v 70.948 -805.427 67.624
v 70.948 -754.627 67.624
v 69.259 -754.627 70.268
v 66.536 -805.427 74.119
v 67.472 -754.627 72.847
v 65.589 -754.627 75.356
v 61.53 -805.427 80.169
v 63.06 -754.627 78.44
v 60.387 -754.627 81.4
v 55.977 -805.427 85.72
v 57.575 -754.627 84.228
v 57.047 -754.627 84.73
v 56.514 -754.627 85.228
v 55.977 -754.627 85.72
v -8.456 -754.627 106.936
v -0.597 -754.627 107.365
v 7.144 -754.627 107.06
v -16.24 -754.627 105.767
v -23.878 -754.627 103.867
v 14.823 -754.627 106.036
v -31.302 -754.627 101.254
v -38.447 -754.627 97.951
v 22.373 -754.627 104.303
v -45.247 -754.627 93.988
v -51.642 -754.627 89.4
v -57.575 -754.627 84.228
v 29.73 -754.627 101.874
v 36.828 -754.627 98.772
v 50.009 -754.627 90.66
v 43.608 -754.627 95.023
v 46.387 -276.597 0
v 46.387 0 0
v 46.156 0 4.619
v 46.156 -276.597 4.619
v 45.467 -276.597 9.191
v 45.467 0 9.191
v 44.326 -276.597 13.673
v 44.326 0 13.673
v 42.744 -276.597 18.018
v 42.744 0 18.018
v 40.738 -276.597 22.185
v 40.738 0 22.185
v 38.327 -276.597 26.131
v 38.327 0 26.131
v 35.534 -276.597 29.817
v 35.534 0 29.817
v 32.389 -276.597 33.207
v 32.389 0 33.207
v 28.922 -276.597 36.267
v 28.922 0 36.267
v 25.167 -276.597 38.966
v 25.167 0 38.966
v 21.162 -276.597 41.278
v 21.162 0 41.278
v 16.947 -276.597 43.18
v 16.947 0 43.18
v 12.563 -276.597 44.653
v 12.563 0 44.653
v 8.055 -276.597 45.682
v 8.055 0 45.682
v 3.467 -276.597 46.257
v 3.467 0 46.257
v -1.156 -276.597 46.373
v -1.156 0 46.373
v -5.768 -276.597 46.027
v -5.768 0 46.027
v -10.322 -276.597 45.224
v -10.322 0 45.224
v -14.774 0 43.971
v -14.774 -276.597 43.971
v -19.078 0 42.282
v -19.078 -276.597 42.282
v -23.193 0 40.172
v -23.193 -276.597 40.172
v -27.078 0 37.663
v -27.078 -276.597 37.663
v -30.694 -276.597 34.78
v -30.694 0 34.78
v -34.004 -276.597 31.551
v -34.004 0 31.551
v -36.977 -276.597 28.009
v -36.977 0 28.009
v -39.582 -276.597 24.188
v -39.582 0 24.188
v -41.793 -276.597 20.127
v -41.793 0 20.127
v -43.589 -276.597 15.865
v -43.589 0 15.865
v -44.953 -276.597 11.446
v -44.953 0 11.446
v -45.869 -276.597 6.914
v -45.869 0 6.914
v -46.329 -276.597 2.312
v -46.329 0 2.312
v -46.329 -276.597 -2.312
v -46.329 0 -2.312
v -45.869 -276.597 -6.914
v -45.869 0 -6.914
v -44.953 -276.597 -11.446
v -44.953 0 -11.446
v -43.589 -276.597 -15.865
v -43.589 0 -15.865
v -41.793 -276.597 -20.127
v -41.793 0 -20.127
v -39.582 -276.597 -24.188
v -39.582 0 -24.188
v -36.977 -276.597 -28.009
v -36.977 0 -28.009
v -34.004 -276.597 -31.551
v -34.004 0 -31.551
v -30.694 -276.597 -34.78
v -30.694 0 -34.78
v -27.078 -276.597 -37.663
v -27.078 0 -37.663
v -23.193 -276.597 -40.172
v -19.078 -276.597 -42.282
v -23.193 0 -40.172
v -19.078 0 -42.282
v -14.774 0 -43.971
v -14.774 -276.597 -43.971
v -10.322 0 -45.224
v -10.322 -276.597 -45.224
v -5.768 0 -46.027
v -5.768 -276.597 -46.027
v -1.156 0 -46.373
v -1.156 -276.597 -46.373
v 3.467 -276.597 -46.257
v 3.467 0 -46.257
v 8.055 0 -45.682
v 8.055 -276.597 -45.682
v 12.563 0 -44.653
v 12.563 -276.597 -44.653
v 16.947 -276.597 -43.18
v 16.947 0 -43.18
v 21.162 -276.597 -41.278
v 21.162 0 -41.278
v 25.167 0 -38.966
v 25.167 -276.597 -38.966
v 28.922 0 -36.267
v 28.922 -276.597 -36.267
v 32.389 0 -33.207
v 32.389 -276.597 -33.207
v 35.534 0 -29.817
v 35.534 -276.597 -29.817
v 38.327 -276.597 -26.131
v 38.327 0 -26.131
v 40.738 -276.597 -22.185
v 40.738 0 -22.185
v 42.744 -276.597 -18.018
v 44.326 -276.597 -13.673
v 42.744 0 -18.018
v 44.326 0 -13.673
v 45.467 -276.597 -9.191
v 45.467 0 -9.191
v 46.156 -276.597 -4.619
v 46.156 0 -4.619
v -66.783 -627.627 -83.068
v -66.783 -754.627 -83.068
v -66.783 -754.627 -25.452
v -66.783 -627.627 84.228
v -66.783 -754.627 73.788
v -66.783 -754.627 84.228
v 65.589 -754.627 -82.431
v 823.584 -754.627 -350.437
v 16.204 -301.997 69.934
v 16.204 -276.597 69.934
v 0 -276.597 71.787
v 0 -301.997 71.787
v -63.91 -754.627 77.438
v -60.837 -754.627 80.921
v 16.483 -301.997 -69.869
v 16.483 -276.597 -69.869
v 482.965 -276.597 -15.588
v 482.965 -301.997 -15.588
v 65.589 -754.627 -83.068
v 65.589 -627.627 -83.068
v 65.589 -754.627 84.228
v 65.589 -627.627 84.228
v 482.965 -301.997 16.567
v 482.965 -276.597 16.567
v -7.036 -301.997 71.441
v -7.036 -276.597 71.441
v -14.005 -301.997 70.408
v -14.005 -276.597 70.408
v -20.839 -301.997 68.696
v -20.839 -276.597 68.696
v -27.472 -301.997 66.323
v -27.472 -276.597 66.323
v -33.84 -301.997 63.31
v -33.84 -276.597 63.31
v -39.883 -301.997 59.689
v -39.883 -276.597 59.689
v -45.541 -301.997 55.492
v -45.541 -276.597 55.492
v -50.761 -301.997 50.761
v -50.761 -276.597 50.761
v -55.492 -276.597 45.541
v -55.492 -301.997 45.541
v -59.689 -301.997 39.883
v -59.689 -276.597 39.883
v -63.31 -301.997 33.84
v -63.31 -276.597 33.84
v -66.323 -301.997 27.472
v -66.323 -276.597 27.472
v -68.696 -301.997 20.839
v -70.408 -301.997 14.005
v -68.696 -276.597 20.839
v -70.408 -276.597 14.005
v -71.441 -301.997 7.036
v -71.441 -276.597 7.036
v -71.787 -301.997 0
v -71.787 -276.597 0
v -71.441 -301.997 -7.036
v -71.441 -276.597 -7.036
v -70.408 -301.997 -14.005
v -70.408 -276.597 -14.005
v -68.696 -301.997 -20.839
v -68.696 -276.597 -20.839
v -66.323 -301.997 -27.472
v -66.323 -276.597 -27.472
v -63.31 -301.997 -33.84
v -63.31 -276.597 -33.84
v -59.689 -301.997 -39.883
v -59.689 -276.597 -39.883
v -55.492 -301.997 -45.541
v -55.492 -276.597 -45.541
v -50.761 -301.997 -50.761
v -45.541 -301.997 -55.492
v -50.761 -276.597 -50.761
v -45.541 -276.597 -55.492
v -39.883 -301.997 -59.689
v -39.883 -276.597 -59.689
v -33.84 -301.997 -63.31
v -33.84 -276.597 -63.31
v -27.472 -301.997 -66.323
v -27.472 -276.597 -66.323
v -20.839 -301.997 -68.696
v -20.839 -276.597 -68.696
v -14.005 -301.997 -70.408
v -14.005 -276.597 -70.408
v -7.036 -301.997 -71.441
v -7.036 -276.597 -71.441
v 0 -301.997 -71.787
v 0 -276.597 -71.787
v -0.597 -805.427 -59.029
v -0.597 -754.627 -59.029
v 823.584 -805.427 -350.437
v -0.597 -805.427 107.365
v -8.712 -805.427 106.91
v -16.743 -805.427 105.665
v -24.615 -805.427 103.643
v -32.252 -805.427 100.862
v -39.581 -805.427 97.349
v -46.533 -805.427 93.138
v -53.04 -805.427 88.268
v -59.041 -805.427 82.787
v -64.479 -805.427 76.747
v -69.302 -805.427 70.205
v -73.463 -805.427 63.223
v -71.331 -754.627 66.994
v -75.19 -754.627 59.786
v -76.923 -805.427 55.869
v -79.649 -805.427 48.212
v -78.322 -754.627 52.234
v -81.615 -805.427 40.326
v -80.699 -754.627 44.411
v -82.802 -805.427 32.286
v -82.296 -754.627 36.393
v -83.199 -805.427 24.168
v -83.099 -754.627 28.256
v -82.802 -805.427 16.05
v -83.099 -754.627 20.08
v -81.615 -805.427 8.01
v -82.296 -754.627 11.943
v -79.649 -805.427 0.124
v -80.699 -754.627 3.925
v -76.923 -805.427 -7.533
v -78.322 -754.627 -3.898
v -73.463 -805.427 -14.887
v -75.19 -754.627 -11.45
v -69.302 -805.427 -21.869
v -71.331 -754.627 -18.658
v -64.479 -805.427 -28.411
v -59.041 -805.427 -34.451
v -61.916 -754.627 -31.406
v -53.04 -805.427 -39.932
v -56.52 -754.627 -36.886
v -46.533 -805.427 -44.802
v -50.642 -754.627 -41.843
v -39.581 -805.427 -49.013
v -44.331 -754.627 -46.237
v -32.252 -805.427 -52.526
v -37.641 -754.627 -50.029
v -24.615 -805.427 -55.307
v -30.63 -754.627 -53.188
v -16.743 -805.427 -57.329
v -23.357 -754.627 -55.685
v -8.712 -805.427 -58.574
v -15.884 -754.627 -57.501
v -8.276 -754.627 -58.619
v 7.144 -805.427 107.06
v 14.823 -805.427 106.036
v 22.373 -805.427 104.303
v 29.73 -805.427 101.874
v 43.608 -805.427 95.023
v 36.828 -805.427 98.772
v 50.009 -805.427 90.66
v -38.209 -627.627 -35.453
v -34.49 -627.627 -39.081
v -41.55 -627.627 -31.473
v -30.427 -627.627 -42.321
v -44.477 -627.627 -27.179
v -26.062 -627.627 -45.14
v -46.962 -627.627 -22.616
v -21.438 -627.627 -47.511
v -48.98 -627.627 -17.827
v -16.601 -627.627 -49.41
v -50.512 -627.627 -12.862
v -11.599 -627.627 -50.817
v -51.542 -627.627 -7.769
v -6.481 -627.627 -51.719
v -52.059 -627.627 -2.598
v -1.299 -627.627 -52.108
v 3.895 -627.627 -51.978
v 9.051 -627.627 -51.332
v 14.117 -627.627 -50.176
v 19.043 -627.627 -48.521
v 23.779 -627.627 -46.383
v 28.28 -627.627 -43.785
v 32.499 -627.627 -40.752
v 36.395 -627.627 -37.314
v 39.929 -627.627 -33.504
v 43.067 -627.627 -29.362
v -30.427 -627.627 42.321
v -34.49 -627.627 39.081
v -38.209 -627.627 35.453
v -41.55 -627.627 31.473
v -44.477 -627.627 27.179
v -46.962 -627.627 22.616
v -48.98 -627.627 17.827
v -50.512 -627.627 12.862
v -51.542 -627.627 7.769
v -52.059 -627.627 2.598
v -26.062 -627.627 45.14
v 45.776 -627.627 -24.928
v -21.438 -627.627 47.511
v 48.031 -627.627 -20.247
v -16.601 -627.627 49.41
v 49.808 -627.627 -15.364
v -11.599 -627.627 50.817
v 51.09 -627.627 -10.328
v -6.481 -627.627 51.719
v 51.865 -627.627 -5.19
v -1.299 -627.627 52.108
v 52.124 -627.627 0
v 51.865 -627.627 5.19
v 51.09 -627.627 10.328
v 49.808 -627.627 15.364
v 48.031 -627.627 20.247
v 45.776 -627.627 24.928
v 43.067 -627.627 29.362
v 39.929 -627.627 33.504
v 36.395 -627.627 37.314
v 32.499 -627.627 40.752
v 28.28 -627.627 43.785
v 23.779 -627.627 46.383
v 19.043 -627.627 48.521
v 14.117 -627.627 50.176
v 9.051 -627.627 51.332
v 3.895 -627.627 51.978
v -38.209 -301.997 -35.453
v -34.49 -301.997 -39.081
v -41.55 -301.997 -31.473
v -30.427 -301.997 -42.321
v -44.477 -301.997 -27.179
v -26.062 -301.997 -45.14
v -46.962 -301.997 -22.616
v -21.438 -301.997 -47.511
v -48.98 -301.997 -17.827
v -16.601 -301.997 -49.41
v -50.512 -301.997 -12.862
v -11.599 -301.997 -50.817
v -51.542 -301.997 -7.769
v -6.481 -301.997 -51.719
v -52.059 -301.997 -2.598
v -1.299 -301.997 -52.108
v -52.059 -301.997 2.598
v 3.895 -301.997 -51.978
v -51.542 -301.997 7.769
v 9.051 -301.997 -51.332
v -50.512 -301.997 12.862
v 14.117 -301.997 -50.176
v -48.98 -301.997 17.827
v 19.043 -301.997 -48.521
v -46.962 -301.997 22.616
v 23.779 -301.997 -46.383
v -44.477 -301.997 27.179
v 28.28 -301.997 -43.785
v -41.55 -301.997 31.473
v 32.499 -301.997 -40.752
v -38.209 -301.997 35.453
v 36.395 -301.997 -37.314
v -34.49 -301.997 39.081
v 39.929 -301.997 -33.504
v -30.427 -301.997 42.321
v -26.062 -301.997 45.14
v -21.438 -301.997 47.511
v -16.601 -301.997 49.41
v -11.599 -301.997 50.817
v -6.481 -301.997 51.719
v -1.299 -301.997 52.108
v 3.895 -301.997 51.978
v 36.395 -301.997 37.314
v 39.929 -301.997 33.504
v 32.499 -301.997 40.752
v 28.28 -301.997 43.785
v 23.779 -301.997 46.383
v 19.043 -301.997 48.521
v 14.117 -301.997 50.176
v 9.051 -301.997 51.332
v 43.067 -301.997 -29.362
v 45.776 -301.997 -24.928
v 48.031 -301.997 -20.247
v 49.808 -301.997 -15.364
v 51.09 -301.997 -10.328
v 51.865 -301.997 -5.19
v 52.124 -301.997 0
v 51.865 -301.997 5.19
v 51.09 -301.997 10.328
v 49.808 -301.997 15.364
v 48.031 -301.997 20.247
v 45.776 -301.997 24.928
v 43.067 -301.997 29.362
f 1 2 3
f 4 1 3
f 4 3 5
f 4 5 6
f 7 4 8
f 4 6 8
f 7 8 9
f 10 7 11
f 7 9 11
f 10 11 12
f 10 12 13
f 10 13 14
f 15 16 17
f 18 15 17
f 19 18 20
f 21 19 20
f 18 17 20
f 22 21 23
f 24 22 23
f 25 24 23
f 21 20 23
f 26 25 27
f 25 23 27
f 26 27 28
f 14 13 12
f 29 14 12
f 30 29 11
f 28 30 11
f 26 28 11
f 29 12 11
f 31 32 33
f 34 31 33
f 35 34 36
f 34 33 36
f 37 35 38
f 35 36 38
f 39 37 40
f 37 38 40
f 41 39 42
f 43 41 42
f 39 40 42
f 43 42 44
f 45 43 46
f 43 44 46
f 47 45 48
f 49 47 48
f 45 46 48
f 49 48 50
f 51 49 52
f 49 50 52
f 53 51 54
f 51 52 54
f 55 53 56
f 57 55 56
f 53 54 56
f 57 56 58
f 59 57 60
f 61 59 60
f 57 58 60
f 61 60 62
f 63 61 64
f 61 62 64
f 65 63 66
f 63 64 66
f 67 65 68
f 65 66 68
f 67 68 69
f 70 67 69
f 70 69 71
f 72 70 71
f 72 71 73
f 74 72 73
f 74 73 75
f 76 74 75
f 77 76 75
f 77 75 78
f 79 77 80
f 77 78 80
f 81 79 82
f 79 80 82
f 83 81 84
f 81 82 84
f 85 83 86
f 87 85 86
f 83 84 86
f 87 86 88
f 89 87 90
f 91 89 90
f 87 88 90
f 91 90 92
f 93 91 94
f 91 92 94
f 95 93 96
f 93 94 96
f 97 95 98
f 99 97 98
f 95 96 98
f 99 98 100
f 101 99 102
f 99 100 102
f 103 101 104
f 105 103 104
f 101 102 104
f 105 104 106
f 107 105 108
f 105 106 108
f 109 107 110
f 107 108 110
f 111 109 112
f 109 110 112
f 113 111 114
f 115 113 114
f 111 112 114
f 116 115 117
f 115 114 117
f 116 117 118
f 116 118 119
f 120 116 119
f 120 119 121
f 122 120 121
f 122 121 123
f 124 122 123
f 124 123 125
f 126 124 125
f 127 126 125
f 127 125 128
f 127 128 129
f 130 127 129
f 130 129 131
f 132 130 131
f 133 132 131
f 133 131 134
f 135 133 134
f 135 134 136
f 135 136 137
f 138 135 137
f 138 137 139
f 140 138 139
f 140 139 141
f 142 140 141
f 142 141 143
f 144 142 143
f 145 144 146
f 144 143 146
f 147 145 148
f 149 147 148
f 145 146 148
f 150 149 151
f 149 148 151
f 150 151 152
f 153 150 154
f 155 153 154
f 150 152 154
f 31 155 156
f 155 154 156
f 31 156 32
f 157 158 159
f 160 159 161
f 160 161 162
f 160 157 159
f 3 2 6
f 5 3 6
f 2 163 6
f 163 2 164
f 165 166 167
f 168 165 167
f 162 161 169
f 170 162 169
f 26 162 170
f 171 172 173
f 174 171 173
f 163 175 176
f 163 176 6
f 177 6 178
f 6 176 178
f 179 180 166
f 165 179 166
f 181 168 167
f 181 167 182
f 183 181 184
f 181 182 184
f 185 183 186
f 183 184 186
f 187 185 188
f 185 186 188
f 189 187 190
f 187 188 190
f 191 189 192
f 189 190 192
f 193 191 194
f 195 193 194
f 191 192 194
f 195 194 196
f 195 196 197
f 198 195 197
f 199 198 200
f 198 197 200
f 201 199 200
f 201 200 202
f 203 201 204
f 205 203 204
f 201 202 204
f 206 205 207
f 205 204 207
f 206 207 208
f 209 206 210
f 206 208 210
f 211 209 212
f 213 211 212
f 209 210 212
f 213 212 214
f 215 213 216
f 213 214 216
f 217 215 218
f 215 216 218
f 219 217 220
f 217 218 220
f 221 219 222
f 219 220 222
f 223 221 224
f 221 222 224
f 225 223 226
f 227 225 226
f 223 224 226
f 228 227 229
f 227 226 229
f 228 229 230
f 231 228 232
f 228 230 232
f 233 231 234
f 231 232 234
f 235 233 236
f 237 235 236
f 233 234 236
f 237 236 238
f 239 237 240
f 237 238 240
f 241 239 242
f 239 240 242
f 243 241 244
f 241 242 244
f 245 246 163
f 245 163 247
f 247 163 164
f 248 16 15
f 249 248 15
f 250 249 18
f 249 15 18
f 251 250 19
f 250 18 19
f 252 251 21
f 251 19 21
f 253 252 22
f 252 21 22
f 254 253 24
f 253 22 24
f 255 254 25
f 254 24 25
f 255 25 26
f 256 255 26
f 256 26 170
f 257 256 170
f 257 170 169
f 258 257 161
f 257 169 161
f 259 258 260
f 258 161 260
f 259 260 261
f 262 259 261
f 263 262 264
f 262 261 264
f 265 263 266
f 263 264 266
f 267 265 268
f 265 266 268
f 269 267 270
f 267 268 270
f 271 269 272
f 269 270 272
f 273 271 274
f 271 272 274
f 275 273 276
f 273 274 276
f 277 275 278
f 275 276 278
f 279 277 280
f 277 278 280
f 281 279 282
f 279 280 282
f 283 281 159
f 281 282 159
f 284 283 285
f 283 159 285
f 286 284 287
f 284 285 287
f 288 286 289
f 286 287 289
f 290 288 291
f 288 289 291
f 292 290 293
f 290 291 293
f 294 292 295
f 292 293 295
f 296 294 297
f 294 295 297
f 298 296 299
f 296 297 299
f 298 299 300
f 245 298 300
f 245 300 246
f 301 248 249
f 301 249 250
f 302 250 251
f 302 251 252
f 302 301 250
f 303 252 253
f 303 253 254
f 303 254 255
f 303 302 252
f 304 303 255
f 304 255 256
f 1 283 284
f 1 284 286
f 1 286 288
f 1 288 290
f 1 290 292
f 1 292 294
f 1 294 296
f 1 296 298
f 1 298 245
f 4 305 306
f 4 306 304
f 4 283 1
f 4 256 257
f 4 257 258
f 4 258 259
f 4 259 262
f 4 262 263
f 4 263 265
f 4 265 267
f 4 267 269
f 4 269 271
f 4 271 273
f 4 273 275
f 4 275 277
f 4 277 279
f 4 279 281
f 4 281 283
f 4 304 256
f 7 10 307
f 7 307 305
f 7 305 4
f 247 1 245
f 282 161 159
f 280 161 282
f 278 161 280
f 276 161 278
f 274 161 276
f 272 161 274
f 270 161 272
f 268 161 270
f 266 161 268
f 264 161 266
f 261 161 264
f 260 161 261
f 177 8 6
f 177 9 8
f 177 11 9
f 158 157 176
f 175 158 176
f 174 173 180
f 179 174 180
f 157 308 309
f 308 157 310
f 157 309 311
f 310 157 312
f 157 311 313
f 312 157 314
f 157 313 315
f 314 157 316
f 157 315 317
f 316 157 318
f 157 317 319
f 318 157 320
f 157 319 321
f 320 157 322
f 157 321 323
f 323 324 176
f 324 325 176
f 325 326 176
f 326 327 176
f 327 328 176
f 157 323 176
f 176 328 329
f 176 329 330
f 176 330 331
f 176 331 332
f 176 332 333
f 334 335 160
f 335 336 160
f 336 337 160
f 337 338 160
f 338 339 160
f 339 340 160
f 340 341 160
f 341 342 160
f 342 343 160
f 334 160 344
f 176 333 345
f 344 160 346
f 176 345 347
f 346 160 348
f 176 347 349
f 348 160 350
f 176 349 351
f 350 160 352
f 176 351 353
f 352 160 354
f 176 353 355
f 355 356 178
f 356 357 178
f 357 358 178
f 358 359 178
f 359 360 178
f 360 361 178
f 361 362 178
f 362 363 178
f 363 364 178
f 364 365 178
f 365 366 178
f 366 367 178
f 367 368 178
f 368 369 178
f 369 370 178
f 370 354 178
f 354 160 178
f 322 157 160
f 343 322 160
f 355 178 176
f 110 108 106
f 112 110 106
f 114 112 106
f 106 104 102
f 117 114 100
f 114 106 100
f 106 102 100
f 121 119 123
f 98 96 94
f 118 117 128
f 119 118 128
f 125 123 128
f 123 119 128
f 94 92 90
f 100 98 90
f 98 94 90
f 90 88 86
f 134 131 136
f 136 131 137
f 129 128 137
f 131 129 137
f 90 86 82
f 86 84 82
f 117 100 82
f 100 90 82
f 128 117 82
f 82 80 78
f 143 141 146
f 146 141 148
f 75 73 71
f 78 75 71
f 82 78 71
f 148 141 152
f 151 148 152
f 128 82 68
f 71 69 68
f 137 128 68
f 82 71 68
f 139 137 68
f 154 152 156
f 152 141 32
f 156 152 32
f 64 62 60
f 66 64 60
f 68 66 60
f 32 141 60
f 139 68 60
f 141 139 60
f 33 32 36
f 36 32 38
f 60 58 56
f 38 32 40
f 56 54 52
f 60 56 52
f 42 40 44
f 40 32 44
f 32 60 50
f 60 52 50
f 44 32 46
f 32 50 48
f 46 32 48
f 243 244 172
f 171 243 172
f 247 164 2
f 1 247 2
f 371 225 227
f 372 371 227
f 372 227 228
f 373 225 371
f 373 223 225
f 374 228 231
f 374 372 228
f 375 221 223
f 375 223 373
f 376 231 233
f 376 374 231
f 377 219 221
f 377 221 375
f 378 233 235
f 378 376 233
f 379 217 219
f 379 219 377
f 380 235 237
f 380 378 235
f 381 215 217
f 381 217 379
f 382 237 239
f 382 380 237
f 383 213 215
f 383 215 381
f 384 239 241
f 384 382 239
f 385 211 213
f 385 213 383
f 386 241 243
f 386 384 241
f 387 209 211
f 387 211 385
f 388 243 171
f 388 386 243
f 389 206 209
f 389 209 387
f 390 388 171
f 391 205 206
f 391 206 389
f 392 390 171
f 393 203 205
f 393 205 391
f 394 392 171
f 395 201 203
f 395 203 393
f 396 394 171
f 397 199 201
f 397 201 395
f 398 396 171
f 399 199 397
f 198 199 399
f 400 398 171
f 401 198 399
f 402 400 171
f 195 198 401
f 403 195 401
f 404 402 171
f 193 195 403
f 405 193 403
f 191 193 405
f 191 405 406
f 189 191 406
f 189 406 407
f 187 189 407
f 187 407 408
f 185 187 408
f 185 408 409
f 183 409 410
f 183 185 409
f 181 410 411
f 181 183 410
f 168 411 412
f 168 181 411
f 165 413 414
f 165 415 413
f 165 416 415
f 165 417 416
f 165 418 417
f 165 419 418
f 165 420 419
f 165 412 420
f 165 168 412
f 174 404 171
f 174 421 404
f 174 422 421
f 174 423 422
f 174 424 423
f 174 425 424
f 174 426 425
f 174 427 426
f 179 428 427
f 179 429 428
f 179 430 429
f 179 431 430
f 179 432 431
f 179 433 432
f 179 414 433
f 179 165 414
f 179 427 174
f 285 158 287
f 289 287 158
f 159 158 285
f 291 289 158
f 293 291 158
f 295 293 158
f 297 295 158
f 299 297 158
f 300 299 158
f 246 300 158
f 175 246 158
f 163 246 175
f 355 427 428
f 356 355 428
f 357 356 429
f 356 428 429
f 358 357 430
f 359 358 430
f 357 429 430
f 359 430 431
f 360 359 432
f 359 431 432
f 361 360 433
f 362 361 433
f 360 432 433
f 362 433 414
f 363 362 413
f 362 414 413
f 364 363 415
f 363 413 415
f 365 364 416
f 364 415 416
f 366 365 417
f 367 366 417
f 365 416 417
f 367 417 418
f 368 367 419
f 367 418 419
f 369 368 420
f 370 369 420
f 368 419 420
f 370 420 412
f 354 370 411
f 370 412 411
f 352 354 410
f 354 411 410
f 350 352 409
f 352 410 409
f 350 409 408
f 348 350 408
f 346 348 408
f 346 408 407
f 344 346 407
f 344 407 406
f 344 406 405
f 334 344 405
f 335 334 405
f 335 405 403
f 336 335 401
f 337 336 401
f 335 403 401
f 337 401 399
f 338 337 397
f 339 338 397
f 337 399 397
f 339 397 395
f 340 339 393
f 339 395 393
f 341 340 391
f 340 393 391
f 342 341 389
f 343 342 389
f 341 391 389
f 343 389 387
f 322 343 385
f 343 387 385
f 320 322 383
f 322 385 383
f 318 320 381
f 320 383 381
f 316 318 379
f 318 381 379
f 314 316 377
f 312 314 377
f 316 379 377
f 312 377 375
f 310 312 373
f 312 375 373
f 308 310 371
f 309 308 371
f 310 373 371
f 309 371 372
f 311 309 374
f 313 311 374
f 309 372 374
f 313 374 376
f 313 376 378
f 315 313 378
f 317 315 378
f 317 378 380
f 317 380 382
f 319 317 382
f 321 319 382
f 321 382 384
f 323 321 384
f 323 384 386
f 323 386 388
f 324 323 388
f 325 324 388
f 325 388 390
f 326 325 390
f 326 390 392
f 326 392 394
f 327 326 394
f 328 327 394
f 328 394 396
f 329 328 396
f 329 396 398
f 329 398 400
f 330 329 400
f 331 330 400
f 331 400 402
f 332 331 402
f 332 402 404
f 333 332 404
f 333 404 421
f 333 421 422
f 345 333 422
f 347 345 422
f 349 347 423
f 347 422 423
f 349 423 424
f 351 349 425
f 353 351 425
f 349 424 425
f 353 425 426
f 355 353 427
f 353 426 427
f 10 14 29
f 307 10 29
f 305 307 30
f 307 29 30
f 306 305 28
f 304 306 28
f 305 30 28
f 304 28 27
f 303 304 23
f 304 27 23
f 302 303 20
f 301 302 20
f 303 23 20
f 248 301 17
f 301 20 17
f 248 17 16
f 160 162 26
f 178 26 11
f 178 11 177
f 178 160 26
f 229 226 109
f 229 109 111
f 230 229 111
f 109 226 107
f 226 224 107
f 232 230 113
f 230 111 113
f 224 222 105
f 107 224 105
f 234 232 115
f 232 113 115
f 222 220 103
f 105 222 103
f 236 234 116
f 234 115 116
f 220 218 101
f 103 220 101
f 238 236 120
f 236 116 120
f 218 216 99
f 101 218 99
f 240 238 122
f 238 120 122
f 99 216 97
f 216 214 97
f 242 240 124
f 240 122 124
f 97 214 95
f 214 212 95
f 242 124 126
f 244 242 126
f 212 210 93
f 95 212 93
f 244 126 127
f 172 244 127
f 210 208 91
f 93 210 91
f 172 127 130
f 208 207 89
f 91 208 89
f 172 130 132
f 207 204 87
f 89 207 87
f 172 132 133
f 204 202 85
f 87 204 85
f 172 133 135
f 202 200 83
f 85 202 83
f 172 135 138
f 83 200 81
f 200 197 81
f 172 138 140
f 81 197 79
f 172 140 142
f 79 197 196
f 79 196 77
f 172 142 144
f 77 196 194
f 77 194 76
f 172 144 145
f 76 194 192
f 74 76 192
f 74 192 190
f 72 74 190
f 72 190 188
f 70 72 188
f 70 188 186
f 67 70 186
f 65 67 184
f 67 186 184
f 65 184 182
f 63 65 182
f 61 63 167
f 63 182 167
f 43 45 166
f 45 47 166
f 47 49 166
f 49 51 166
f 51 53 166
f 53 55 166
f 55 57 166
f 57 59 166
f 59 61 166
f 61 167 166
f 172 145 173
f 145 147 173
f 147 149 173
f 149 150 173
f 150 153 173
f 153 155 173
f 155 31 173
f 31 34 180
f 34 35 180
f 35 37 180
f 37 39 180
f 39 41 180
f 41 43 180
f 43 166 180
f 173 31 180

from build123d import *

# Parameters (mm, degrees)
F0_R     = 46.3869587869
F7_DEPTH = 276.5972781926
F8_R     = 46.3869587869
F1_DEPTH = 25.4
F2_R     = 52.1237255929
F3_DEPTH = 325.6295006722
F4_W     = 132.3714181781
F4_H     = 167.2963500023
F5_DEPTH = 127
F9_DEPTH = 50.8


with BuildPart() as f7:
    # F0 (on Front) → F7 (new body)
    with BuildSketch(Plane.XZ):
        Circle(F0_R)
    extrude(amount=F7_DEPTH)

    # F8 (on face) → F1 (join)
    with BuildSketch(Plane.XZ.offset(276.5972781926)):
        with BuildLine():
            Line((482.9649029074, 16.5669820287), (16.2037538756, 69.9342963946))
            ThreePointArc((16.2037538756, 69.9342963946), (56.1986906588, 44.6662581834), (71.7869587869, 0))
            ThreePointArc((71.7869587869, 0), (56.2879281413, -44.5537495328), (16.4834153308, -69.8689091865))
            Line((16.4834153308, -69.8689091865), (482.9649029074, -15.5880084808))
            Line((482.9649029074, -15.5880084808), (482.9649029074, 16.5669820287))
        make_face()
        with BuildLine():
            Line((16.2037538756, 69.9342963946), (0, 71.7869587869))
            ThreePointArc((0, 71.7869587869), (-71.7869587869, 0), (0, -71.7869587869))
            Line((0, -71.7869587869), (16.4834153308, -69.8689091865))
            ThreePointArc((16.4834153308, -69.8689091865), (56.2879281413, -44.5537495328), (71.7869587869, 0))
            ThreePointArc((71.7869587869, 0), (56.1986906588, 44.6662581834), (16.2037538756, 69.9342963946))
        make_face()
        Circle(F8_R, mode=Mode.SUBTRACT)
        Circle(F8_R)
    extrude(amount=F1_DEPTH)

    # F2 (on face) → F3 (join)
    with BuildSketch(Plane.XZ.offset(301.9972781926)):
        Circle(F2_R)
    extrude(amount=F3_DEPTH)

    # F4 (on face) → F5 (join)
    with BuildSketch(Plane.XZ.offset(627.6267788649)):
        with Locations((-0.5969889462, 0.5796924233)):
            Rectangle(F4_W, F4_H)
    extrude(amount=F5_DEPTH)

    # F6 (on face) → F9 (join)
    with BuildSketch(Plane.XZ.offset(754.6267788649)):
        with BuildLine():
            Line((-0.5969889462, 107.3650692829), (55.9769339649, 85.7203485594))
            ThreePointArc((55.9769339649, 85.7203485594), (29.7297504424, 101.8741817091), (-0.5969889462, 107.3650692829))
        make_face()
        with BuildLine():
            ThreePointArc((70.9482696087, 67.6243206263), (64.1043554081, 77.2032748025), (55.9769339649, 85.7203485594))
            Line((55.9769339649, 85.7203485594), (-0.5969889462, 107.3650692829))
            Line((-0.5969889462, 107.3650692829), (70.9482696087, 67.6243206263))
        make_face()
        with BuildLine():
            Line((70.9482696087, 67.6243206263), (-0.5969889462, 107.3650692829))
            ThreePointArc((-0.5969889462, 107.3650692829), (-83.1992115072, 24.1679996252), (-0.5969889462, -59.0290700325))
            ThreePointArc((-0.5969889462, -59.0290700325), (58.6192791913, -34.8734172151), (83.1992115072, 24.1679996252))
            ThreePointArc((83.1992115072, 24.1679996252), (80.0779273104, 46.7430821962), (70.9482696087, 67.6243206263))
        make_face()
        with BuildLine():
            Line((823.5844914503, -350.4373025497), (70.9482696087, 67.6243206263))
            ThreePointArc((70.9482696087, 67.6243206263), (80.0779273104, 46.7430821962), (83.1992115072, 24.1679996252))
            ThreePointArc((83.1992115072, 24.1679996252), (58.6192791913, -34.8734172151), (-0.5969889462, -59.0290700325))
            Line((-0.5969889462, -59.0290700325), (823.5844914503, -350.4373025497))
        make_face()
    extrude(amount=F9_DEPTH)


solid = f7.part
